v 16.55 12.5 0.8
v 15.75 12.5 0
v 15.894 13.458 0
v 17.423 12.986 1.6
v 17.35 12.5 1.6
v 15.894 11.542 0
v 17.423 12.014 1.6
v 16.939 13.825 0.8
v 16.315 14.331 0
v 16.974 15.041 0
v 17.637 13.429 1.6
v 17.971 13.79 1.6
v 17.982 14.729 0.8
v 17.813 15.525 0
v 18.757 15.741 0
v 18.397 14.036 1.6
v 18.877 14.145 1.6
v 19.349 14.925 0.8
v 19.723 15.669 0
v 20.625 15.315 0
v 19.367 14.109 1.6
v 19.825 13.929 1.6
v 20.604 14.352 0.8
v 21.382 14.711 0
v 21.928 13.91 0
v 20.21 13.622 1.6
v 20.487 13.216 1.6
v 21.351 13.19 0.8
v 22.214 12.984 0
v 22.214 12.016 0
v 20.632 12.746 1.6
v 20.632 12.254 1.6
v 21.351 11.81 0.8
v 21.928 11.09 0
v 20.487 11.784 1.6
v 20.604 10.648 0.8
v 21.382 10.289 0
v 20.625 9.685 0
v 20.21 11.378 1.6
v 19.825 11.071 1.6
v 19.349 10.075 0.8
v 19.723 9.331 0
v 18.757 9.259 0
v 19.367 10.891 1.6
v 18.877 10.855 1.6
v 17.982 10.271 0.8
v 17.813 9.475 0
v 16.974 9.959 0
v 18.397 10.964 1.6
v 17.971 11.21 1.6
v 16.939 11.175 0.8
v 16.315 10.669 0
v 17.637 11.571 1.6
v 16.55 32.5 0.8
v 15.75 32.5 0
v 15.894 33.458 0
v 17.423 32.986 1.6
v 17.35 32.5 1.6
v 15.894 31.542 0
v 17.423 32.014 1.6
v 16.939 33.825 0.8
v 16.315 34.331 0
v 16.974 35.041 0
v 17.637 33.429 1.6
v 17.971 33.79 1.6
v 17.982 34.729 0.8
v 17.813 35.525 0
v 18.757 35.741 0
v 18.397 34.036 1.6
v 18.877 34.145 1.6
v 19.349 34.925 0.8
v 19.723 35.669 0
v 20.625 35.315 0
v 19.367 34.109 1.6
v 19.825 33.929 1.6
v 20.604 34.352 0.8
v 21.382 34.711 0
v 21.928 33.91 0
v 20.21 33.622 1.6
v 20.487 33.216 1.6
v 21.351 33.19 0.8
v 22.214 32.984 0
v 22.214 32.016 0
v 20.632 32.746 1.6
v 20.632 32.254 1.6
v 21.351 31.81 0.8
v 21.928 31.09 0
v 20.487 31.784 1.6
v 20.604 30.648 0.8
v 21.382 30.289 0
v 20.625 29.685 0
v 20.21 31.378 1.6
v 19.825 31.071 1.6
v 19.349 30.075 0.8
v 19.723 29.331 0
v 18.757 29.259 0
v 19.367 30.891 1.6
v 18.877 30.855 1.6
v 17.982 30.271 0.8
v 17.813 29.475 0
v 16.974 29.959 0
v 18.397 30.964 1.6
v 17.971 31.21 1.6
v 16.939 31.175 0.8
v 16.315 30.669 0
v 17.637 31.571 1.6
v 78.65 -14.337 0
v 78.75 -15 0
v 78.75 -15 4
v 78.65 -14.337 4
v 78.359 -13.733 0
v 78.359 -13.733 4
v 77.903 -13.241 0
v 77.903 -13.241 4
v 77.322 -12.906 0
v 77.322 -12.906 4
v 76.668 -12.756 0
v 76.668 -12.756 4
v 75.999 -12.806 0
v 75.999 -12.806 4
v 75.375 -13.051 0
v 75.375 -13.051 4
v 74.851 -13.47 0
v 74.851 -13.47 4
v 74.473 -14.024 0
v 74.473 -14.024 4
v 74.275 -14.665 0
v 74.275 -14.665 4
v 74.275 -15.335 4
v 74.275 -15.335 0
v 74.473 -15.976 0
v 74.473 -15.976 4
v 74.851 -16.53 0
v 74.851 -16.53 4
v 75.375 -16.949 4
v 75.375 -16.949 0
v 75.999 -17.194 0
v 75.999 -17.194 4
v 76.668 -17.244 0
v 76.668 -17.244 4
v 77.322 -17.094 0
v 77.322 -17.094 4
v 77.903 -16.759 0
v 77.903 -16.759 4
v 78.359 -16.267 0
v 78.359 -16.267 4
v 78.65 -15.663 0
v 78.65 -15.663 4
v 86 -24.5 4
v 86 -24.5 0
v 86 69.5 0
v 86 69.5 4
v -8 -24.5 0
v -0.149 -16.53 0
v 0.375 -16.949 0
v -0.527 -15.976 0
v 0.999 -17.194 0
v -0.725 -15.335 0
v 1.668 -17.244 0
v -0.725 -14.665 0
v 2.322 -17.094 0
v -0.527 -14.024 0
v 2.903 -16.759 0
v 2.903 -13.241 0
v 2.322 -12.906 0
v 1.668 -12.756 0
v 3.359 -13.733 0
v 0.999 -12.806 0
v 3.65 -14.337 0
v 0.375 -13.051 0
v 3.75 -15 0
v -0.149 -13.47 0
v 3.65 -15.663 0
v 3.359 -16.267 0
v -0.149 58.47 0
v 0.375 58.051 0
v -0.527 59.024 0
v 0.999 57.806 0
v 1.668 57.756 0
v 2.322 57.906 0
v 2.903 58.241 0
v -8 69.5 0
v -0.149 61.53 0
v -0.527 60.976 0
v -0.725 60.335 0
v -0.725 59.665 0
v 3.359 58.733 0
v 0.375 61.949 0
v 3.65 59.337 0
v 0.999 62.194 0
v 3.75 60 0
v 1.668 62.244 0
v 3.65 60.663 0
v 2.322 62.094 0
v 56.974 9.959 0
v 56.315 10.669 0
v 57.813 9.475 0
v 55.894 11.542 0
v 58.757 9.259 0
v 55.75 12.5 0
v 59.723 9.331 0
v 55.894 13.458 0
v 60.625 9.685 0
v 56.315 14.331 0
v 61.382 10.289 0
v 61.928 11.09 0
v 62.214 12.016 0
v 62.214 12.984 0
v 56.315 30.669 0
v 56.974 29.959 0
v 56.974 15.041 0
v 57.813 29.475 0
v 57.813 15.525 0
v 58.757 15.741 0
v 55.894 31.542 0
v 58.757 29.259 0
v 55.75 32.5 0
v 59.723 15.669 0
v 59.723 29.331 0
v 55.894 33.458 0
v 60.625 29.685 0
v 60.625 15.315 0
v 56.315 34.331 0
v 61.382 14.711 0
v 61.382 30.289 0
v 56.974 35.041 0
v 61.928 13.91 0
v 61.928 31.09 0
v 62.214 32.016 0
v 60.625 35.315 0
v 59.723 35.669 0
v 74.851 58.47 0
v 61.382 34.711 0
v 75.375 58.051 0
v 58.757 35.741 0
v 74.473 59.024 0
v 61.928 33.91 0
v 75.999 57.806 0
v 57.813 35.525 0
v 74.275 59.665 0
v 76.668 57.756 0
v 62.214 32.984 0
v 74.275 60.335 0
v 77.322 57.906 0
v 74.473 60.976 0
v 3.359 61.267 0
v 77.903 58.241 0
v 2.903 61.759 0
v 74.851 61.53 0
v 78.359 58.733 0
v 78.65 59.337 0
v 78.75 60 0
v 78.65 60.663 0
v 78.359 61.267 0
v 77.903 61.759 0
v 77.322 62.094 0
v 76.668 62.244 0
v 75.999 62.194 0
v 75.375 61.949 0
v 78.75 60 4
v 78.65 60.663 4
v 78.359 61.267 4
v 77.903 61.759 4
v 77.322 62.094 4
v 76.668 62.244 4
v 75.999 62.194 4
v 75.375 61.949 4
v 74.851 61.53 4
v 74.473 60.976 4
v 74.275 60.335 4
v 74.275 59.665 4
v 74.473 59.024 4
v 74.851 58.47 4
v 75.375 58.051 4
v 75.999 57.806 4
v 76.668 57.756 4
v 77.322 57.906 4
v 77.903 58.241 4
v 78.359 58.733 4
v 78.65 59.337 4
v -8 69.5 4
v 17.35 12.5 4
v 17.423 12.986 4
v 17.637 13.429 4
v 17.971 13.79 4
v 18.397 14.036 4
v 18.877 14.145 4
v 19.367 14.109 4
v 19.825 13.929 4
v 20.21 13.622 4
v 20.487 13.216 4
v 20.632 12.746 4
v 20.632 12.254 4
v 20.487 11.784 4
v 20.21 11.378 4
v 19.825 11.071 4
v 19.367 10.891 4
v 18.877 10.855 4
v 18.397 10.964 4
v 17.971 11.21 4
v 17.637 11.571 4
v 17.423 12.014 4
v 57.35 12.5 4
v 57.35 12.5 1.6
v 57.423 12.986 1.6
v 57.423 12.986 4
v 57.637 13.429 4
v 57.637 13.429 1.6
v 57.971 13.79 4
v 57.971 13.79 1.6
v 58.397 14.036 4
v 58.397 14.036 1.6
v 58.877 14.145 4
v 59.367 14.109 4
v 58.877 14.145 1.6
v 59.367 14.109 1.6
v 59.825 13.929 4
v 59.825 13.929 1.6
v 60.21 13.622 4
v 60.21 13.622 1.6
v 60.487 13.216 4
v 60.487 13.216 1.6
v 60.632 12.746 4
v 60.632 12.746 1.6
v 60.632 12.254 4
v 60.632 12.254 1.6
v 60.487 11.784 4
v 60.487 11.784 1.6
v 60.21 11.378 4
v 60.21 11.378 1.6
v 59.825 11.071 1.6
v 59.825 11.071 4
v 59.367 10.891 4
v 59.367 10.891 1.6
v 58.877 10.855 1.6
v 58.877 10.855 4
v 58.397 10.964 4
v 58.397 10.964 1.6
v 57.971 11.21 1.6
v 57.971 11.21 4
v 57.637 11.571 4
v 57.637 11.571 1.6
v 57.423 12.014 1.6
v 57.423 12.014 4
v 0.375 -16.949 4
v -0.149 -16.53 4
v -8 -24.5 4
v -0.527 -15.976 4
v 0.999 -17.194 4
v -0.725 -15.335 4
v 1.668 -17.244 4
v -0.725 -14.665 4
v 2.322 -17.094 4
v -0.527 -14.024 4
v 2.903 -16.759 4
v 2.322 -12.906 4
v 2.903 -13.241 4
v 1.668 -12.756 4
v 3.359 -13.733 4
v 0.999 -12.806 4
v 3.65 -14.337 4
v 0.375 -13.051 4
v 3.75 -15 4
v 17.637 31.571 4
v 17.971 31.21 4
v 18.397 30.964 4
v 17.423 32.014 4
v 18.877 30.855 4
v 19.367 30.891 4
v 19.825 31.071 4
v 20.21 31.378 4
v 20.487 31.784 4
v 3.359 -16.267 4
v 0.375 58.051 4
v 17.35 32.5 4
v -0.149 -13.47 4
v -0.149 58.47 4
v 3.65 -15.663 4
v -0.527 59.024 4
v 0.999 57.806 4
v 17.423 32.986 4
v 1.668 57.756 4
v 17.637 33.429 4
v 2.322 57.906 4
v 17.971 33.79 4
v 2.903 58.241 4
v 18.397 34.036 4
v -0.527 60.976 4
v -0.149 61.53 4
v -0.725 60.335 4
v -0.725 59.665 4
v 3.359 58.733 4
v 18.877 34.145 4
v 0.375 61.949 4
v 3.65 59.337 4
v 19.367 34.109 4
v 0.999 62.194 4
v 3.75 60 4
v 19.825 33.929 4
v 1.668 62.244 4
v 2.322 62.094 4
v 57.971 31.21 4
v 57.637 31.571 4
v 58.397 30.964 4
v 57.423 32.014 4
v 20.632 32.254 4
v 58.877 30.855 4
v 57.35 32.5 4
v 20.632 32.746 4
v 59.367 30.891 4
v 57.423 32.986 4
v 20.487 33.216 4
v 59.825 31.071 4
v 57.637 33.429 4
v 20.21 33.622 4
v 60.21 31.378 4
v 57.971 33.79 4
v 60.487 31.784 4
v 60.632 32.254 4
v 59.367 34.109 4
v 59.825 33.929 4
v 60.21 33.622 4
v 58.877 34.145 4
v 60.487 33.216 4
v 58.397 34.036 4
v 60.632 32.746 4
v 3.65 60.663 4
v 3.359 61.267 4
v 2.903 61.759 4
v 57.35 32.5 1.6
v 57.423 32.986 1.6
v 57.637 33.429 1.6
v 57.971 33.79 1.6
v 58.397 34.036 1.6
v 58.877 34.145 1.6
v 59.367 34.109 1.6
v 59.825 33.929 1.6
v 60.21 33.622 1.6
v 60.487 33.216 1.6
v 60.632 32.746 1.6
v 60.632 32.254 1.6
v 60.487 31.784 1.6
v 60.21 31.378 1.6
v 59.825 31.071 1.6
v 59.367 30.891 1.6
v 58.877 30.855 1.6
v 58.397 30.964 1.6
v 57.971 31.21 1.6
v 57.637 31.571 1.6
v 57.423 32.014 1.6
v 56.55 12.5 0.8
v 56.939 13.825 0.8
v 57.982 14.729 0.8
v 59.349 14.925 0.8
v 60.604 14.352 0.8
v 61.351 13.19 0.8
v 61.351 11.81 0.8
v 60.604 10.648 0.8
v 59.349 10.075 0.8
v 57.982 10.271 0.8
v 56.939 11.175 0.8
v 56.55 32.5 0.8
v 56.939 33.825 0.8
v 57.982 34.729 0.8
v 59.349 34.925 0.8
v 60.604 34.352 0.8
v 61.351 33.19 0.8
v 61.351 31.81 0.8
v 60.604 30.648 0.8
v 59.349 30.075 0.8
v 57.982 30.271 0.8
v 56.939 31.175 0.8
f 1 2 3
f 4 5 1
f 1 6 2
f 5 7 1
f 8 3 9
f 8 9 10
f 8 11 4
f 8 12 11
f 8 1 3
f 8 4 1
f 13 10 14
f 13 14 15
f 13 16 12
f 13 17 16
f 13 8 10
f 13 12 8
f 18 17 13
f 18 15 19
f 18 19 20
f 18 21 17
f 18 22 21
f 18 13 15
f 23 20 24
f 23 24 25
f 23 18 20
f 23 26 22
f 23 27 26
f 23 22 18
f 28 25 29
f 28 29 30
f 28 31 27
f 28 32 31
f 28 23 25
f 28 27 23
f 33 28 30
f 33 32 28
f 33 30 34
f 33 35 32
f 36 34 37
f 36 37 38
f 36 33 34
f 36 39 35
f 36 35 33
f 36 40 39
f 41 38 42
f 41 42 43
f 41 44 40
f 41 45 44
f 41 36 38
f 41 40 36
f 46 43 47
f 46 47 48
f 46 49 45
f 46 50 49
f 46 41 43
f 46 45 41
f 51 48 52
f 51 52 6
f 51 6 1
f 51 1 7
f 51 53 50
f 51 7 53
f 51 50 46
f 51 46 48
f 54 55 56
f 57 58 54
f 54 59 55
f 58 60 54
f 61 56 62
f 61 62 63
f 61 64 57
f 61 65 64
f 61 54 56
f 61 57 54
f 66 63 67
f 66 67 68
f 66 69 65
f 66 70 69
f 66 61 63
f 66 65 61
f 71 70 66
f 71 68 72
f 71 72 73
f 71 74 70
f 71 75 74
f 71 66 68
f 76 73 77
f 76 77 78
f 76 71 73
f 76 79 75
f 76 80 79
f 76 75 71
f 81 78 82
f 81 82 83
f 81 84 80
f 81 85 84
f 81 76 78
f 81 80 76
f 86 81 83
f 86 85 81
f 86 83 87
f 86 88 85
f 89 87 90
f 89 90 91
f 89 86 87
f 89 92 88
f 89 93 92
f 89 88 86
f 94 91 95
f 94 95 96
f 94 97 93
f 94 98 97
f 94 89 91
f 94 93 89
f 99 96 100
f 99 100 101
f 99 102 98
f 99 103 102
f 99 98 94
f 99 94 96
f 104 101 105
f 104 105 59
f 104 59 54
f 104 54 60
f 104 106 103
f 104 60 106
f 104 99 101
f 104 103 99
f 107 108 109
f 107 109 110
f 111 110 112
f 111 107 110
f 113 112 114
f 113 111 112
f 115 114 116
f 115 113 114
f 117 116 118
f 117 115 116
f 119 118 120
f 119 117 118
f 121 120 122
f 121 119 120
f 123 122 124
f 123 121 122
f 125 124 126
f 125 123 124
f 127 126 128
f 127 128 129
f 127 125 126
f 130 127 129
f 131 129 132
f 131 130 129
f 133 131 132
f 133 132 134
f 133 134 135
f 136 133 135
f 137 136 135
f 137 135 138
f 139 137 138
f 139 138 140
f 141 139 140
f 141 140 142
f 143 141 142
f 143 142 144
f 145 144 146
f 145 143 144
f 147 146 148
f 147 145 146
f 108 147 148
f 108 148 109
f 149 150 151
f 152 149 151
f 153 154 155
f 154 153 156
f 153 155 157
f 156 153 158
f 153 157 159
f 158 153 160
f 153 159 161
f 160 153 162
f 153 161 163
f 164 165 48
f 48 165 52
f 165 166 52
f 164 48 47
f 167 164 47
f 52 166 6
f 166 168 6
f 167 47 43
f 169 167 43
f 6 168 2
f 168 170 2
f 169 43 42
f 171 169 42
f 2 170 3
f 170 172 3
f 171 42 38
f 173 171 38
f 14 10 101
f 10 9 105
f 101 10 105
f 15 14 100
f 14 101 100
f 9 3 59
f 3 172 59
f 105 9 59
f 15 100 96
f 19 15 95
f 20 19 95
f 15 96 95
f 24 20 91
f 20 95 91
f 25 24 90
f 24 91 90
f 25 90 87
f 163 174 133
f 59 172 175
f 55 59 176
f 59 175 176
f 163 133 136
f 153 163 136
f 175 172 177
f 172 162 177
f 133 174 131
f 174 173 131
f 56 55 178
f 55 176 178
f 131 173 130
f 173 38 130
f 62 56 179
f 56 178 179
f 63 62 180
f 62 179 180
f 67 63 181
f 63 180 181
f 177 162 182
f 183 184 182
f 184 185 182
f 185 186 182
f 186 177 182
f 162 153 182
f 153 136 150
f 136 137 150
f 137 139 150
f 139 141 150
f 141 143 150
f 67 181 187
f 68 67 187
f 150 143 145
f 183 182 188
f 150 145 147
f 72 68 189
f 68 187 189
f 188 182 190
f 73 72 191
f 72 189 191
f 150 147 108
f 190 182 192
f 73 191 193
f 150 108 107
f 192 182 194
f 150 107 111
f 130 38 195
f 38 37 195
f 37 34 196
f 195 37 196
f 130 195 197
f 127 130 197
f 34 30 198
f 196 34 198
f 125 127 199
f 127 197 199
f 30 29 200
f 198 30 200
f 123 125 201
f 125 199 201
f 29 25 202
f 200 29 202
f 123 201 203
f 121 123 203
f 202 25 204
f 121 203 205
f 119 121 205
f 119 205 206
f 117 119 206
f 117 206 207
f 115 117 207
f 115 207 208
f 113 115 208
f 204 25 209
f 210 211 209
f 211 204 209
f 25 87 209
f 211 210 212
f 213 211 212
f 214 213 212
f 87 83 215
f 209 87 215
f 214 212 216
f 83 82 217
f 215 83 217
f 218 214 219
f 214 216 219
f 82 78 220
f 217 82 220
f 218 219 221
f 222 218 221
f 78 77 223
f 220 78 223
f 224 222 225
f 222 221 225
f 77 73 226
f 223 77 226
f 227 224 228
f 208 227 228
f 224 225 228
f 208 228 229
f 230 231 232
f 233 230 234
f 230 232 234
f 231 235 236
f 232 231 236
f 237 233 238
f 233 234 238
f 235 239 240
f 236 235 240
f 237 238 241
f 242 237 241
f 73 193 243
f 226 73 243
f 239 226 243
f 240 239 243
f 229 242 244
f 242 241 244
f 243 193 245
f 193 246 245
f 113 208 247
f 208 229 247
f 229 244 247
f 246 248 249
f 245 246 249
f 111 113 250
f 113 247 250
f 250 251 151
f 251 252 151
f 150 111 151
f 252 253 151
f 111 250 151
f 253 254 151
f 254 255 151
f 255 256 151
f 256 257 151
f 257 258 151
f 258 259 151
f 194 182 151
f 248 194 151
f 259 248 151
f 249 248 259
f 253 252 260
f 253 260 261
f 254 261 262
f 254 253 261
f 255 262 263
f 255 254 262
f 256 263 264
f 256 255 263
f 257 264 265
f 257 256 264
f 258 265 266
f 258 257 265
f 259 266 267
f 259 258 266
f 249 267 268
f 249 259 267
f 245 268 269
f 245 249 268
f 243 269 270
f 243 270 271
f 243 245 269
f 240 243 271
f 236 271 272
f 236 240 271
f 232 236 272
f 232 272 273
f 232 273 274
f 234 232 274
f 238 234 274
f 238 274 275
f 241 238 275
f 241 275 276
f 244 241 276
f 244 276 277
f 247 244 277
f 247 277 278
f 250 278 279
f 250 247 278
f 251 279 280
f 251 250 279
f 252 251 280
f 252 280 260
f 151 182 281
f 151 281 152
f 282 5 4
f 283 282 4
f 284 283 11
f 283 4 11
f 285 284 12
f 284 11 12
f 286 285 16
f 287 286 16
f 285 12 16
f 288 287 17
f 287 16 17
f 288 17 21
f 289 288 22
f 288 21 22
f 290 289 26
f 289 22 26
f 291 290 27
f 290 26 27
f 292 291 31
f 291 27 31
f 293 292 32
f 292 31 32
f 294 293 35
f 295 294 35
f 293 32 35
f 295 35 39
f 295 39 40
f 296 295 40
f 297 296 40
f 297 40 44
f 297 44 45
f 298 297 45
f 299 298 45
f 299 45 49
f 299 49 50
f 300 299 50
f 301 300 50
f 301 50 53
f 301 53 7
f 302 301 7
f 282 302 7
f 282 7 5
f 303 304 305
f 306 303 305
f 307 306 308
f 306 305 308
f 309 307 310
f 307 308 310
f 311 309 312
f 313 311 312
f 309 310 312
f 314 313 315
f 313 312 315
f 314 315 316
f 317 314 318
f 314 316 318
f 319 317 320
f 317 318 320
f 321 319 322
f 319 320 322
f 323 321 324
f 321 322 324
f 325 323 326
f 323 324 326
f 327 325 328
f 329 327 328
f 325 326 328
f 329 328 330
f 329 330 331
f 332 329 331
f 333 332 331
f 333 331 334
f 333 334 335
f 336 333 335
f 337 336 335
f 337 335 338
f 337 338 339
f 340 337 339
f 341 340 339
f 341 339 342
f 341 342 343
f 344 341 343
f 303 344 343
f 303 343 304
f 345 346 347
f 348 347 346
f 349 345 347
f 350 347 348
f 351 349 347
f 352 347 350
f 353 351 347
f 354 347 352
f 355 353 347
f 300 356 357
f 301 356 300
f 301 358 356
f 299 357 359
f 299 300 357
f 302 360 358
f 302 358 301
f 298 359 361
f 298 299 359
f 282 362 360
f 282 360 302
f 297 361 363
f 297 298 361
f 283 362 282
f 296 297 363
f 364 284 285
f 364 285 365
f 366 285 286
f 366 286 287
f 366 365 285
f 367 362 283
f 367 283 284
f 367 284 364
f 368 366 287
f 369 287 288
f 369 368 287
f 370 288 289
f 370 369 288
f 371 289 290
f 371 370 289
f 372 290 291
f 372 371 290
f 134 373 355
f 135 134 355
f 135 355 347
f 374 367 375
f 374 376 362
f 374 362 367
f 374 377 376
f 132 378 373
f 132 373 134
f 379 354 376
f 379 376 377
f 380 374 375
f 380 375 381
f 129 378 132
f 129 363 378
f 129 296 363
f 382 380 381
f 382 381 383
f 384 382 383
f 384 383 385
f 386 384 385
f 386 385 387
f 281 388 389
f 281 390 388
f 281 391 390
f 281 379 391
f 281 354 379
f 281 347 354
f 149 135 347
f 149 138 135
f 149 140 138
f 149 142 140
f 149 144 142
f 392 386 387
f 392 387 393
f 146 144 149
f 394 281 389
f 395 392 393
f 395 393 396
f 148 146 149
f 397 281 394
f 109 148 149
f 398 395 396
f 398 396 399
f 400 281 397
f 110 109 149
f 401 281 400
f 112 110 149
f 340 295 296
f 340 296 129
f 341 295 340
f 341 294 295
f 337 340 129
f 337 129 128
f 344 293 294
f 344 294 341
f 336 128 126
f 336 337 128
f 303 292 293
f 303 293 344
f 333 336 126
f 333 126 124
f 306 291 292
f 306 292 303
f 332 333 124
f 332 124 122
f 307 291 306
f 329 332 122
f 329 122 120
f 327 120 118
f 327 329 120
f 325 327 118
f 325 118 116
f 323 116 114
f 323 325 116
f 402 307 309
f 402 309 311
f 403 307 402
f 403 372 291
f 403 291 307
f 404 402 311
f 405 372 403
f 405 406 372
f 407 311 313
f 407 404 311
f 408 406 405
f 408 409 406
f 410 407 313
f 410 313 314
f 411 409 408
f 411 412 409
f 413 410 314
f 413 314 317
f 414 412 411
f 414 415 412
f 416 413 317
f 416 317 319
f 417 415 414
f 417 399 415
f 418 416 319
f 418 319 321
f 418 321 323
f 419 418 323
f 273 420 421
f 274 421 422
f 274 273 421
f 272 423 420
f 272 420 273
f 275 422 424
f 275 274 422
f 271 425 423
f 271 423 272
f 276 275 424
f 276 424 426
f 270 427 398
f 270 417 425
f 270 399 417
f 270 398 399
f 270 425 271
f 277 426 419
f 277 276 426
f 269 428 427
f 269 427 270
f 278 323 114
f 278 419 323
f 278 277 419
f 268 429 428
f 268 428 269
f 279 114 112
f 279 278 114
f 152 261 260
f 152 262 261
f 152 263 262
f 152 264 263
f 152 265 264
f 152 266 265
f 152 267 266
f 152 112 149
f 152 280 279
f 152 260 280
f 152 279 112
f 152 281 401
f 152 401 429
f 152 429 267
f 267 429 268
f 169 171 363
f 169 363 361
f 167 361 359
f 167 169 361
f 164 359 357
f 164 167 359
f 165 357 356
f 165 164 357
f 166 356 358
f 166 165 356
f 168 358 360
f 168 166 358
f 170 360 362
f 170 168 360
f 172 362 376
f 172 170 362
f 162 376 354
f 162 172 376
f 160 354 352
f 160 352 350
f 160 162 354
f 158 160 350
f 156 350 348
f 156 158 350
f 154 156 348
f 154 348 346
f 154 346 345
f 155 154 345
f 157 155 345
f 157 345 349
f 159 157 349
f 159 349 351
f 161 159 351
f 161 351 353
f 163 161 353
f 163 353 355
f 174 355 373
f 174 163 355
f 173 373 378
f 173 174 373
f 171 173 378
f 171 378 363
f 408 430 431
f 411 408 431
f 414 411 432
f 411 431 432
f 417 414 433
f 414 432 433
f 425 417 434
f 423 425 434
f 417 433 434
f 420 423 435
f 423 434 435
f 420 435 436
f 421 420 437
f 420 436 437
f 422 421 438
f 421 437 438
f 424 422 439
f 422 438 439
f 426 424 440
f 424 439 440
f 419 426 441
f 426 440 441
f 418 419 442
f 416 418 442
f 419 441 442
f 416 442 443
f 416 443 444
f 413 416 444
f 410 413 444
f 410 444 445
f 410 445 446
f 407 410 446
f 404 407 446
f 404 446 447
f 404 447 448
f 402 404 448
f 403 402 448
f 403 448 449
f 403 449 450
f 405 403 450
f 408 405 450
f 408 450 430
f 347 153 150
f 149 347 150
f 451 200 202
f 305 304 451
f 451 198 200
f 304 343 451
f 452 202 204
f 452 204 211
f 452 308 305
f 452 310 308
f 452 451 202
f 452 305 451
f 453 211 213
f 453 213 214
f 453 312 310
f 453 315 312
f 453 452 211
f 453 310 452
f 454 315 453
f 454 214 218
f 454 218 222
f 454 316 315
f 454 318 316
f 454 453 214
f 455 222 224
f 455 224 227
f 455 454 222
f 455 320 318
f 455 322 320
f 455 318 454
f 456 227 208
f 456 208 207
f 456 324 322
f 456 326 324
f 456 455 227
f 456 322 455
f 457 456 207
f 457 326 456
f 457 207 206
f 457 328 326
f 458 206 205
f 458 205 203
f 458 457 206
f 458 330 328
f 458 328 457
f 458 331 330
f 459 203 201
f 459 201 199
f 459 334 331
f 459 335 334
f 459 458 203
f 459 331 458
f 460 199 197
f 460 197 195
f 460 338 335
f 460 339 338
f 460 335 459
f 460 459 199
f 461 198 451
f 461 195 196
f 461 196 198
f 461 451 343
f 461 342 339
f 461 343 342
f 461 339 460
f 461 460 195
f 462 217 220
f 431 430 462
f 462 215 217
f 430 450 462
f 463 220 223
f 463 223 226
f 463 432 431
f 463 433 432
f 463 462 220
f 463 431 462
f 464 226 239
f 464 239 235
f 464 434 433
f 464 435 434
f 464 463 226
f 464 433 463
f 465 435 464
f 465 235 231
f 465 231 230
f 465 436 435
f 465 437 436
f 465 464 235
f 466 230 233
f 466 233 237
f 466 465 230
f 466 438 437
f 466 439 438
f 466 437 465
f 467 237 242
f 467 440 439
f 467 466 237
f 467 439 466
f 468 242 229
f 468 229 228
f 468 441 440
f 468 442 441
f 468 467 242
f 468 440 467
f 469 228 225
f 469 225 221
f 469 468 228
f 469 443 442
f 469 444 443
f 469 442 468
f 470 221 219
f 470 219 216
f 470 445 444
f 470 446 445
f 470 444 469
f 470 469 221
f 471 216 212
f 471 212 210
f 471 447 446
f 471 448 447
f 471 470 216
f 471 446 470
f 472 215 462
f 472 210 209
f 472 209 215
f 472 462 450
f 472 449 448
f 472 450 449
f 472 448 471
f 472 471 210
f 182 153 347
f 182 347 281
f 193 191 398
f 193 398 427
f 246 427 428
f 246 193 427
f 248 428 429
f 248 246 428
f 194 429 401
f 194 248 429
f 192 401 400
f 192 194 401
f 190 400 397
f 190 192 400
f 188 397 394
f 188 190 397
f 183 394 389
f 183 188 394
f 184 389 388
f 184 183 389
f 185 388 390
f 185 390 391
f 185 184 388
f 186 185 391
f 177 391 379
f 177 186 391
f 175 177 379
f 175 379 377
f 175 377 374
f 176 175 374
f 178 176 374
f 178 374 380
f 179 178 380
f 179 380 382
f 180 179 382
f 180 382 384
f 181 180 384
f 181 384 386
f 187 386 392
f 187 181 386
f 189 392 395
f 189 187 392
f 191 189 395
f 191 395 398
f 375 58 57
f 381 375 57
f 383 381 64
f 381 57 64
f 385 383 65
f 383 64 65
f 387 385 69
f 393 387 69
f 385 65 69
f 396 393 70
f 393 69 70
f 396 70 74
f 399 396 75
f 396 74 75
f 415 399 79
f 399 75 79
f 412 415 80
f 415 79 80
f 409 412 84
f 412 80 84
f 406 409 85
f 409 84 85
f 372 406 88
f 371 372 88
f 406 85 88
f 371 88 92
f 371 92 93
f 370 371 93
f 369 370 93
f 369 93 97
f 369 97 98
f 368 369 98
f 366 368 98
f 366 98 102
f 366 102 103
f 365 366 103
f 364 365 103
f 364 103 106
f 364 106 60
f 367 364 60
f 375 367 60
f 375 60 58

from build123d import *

# Parameters (mm, degrees)
SKETCH1_W           = 78
SKETCH1_H           = 45
SKETCH1_R           = 1.6
BOSS_EXTRUDE1_DEPTH = 4
SKETCH5_W           = 94
SKETCH5_H           = 94
SKETCH5_R           = 2.25
BOSS_EXTRUDE3_DEPTH = 4
SKETCH6_R           = 1.65
CUT_EXTRUDE1_DEPTH  = 5
CHAMFER1_SIZE       = 1.6


with BuildPart() as part:
    # Sketch1 → Boss-Extrude1 (new body)
    with BuildSketch(Plane.XY):
        with Locations((39, 22.5)):
            Rectangle(SKETCH1_W, SKETCH1_H)
        with Locations((19, 32.5)):
            Circle(SKETCH1_R, mode=Mode.SUBTRACT)
        with Locations((59, 32.5)):
            Circle(SKETCH1_R, mode=Mode.SUBTRACT)
        with Locations((59, 12.5)):
            Circle(SKETCH1_R, mode=Mode.SUBTRACT)
        with Locations((19, 12.5)):
            Circle(SKETCH1_R, mode=Mode.SUBTRACT)
    extrude(amount=BOSS_EXTRUDE1_DEPTH)

    # Sketch5 → Boss-Extrude3 (add)
    with BuildSketch(Plane.XY):
        with Locations((39, 22.5)):
            Rectangle(SKETCH5_W, SKETCH5_H)
        with Locations((1.5, 60)):
            Circle(SKETCH5_R, mode=Mode.SUBTRACT)
        with Locations((76.5, 60)):
            Circle(SKETCH5_R, mode=Mode.SUBTRACT)
        with Locations((76.5, -15)):
            Circle(SKETCH5_R, mode=Mode.SUBTRACT)
        with Locations((1.5, -15)):
            Circle(SKETCH5_R, mode=Mode.SUBTRACT)
    extrude(amount=BOSS_EXTRUDE3_DEPTH)

    # Sketch6 → Cut-Extrude1 (cut, through all)
    with BuildSketch(Plane(origin=(0, 0, 0), x_dir=(-1, 0, 0), z_dir=(0, 0, -1))):
        with Locations((-59, 32.5)):
            Circle(SKETCH6_R)
        with Locations((-59, 12.5)):
            Circle(SKETCH6_R)
        with Locations((-19, 12.5)):
            Circle(SKETCH6_R)
        with Locations((-19, 32.5)):
            Circle(SKETCH6_R)
    extrude(amount=-CUT_EXTRUDE1_DEPTH, mode=Mode.SUBTRACT)

    # Chamfer1
    chamfer1_edges = [part.edges().sort_by_distance(p)[0] for p in [
        (20.65, 32.5, 0),
        (20.65, 12.5, 0),
        (60.65, 12.5, 0),
        (60.65, 32.5, 0),
    ]]
    chamfer(chamfer1_edges, length=CHAMFER1_SIZE)


solid = part.part
